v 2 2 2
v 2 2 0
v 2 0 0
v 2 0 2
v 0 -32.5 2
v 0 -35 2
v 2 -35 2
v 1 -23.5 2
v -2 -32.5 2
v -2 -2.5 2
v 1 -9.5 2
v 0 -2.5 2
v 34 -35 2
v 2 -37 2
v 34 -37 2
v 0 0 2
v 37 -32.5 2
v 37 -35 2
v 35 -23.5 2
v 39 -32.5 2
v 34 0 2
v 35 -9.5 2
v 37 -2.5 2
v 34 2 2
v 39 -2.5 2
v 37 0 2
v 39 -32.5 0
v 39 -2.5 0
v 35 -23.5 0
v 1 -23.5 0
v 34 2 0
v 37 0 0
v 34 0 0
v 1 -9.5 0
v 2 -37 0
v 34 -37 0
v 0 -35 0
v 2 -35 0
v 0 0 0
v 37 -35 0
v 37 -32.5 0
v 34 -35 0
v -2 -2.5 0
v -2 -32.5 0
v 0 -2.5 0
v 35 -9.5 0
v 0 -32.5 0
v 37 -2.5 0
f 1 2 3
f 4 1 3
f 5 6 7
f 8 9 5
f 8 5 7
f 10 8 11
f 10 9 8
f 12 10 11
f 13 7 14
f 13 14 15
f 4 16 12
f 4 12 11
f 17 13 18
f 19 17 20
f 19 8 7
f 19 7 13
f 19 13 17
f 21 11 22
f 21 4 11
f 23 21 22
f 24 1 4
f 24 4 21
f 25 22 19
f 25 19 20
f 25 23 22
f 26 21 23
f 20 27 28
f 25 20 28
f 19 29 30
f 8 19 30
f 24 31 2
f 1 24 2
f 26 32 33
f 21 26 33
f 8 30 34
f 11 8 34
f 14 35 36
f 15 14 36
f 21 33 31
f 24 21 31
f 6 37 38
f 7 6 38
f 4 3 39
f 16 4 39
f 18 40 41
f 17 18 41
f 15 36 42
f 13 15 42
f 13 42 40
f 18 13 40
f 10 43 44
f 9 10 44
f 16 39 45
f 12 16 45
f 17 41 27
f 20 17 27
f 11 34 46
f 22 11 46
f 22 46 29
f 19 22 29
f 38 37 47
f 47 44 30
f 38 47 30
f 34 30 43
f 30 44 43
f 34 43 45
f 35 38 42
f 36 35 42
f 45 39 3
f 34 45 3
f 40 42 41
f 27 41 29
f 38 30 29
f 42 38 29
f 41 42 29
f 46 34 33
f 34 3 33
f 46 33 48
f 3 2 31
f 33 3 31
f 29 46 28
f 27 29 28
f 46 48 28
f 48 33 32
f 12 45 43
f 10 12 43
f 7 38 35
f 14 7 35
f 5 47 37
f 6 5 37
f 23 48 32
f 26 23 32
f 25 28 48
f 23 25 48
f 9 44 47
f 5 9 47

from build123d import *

# Parameters (mm, degrees)
EXTRUDE_1_DEPTH = 2


with BuildPart() as part:
    # 草图1 → 凸台-拉伸1 (new body)
    with BuildSketch(Plane.XY):
        Polygon((0, -35), (2, -35), (2, -37), (34, -37), (34, -35), (37, -35), (37, -32.5), (39, -32.5), (39, -2.5), (37, -2.5), (37, 0), (34, 0), (34, 2), (2, 2), (2, 0), (0, 0), (0, -2.5), (-2, -2.5), (-2, -32.5), (0, -32.5), align=None)
        Polygon((18, -23.5), (2.5, -23.5), (1, -23.5), (1, -11.5), (1, -9.5), (35, -9.5), (35, -11.5), (35, -23.5), (33.5, -23.5), align=None, mode=Mode.SUBTRACT)
    extrude(amount=EXTRUDE_1_DEPTH)


solid = part.part
